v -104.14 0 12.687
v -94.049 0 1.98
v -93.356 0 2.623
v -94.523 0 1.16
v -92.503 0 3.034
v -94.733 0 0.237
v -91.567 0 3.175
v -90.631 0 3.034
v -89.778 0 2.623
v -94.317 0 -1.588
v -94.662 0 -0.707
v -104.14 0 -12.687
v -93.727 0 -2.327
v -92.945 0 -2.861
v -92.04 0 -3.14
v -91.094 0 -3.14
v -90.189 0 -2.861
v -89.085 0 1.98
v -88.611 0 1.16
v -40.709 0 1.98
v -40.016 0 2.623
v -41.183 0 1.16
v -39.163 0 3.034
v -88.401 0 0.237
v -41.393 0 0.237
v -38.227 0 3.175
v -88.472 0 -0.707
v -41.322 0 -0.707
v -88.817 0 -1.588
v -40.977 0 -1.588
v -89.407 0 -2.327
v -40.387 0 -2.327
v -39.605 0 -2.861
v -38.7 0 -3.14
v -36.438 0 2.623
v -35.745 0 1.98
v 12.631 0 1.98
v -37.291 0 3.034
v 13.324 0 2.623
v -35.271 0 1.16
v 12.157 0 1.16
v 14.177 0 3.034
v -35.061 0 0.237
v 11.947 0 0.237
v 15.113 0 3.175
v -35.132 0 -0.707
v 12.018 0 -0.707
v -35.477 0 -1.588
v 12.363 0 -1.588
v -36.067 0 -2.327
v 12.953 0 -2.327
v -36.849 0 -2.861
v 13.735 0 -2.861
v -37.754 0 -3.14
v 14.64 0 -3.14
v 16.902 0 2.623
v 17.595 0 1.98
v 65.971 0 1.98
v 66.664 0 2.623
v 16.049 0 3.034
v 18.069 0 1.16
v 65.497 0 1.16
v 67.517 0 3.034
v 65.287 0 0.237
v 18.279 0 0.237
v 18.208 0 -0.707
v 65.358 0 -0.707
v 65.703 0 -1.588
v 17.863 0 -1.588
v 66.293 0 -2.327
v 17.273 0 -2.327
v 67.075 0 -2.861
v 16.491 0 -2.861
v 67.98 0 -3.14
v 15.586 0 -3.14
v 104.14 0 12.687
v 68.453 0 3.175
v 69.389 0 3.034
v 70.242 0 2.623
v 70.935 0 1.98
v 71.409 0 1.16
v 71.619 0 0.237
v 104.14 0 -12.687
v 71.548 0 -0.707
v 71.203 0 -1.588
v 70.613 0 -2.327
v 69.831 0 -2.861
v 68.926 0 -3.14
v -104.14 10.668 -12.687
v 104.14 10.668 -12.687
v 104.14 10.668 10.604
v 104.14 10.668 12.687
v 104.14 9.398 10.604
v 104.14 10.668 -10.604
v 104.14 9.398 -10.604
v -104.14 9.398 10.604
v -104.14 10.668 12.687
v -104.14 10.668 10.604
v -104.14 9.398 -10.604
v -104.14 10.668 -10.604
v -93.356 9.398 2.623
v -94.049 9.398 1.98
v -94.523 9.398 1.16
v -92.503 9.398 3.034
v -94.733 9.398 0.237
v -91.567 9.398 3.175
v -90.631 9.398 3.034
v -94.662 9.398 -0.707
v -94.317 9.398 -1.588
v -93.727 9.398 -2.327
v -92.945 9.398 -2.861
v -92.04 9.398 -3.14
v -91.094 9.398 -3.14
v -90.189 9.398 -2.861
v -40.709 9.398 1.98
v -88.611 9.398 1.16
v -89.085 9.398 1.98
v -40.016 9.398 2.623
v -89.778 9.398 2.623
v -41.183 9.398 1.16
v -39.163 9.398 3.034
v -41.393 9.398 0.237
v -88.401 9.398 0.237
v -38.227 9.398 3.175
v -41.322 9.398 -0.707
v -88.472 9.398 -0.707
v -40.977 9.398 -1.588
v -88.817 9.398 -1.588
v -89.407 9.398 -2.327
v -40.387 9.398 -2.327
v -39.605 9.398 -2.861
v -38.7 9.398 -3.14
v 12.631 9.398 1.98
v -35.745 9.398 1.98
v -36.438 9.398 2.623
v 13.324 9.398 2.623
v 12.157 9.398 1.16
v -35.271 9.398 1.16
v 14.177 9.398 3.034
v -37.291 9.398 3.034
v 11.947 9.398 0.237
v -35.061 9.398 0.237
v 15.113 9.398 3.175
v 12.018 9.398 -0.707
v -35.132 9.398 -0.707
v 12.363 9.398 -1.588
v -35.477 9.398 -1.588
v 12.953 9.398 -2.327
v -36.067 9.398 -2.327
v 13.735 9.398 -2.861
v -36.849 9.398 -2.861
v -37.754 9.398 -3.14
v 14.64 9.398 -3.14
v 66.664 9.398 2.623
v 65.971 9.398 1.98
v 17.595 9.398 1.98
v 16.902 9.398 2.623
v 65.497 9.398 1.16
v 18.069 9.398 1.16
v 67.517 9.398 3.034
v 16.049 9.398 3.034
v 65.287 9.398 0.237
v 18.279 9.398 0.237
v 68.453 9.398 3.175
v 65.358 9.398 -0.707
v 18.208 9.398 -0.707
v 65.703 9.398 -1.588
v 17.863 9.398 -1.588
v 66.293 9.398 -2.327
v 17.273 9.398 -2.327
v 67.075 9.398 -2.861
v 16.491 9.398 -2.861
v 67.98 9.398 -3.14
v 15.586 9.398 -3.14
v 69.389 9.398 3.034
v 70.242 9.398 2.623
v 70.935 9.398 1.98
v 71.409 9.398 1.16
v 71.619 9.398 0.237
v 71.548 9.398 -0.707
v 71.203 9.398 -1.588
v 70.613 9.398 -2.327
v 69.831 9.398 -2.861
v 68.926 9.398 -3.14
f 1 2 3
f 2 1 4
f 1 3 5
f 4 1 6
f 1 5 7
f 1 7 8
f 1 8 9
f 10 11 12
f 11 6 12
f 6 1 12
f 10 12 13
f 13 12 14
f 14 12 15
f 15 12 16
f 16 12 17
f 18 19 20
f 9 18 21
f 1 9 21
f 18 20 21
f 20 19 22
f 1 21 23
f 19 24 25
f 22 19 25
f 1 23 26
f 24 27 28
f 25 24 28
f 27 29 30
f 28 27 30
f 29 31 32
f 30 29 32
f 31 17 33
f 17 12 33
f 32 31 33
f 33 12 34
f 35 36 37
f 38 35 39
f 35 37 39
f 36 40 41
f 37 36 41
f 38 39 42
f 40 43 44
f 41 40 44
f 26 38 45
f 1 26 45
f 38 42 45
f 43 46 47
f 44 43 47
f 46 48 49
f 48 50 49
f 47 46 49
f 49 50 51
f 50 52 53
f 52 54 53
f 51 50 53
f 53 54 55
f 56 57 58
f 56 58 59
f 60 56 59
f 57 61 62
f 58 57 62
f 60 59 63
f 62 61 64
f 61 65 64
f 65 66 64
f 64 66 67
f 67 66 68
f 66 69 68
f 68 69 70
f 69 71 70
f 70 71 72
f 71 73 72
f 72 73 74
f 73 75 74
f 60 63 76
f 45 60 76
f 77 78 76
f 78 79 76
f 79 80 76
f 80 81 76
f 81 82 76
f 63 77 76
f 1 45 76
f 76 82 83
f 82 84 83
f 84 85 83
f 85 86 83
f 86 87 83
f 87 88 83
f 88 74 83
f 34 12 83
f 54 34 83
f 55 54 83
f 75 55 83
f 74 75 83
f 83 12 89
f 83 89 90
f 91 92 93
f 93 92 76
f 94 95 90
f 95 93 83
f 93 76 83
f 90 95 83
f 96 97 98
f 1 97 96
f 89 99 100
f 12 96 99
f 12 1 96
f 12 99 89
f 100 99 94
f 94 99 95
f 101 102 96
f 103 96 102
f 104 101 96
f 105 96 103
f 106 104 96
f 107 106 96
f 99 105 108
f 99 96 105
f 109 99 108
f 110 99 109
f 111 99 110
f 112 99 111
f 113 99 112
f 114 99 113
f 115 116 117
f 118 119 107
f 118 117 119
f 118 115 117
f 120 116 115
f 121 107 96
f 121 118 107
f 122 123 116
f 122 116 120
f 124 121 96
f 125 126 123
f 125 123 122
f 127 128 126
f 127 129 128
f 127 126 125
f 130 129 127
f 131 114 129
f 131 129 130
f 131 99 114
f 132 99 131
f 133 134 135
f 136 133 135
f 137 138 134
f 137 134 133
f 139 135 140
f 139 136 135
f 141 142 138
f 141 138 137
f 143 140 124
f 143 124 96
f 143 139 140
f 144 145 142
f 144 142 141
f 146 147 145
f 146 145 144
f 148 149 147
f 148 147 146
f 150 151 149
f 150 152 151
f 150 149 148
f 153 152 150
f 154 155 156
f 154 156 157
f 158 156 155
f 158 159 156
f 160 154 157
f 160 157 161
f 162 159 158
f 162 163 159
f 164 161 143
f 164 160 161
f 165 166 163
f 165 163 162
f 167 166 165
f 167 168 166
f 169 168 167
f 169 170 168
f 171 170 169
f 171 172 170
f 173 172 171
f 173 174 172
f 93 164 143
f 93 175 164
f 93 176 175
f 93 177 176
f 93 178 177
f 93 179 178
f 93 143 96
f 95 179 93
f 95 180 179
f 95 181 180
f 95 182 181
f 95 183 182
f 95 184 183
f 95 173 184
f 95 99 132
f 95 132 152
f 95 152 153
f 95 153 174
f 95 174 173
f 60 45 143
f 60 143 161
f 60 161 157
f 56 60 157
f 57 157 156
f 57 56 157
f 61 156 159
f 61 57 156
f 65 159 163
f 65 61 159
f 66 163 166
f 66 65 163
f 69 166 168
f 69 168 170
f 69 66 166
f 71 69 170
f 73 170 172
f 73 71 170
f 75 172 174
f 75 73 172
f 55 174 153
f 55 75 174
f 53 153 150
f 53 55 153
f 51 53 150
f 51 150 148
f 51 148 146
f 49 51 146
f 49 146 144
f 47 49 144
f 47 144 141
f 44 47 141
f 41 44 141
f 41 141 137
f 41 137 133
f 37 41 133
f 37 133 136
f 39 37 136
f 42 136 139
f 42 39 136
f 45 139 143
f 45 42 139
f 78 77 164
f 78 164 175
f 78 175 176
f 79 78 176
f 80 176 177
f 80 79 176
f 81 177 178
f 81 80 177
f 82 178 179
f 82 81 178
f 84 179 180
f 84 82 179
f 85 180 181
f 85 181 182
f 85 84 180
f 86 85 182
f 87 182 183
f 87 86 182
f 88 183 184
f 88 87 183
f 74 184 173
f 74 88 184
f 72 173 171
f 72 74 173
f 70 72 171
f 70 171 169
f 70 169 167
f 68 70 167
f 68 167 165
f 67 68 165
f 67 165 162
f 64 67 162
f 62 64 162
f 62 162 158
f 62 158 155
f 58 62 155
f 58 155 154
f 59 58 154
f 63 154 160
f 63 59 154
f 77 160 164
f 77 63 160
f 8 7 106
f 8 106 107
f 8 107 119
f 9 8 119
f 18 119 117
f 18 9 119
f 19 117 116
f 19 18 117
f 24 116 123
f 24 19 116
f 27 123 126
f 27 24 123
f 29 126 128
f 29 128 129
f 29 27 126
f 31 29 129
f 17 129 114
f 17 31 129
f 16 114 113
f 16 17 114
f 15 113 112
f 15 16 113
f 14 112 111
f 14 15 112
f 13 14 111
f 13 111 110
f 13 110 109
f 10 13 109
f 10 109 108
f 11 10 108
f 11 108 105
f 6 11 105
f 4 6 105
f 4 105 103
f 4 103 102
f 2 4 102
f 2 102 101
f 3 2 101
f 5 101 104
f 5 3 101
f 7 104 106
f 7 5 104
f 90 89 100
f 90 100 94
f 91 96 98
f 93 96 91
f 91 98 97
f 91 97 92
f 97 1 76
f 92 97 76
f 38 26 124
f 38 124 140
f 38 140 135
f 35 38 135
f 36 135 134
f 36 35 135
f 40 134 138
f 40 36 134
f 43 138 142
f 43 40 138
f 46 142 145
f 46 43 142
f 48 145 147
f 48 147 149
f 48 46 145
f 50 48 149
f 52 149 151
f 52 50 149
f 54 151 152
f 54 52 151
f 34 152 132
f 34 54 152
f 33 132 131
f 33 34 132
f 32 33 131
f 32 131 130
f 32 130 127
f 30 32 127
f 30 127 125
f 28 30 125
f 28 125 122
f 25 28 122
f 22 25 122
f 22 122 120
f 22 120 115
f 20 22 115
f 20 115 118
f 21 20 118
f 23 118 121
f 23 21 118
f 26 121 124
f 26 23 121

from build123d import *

# Parameters (mm, degrees)
SKETCH1_W           = 208.28
SKETCH1_H           = 25.3746
SKETCH1_R           = 3.175
BOSS_EXTRUDE1_DEPTH = 9.398
SKETCH2_W           = 208.28
SKETCH2_H           = 2.0828
BOSS_EXTRUDE2_DEPTH = 1.27


with BuildPart() as part:
    # Sketch1 → Boss-Extrude1 (new body)
    with BuildSketch(Plane(origin=(0, 0, 0), x_dir=(1, 0, 0), z_dir=(0, 1, 0))):
        Rectangle(SKETCH1_W, SKETCH1_H)
        with Locations(Location((-91.567, 0, 0), (0, 0, 270))):
            Circle(SKETCH1_R, mode=Mode.SUBTRACT)
        with Locations(Location((-38.227, 0, 0), (0, 0, 270))):
            Circle(SKETCH1_R, mode=Mode.SUBTRACT)
        with Locations(Location((15.113, 0, 0), (0, 0, 270))):
            Circle(SKETCH1_R, mode=Mode.SUBTRACT)
        with Locations(Location((68.453, 0, 0), (0, 0, 270))):
            Circle(SKETCH1_R, mode=Mode.SUBTRACT)
    extrude(amount=BOSS_EXTRUDE1_DEPTH)

    # Sketch2 → Boss-Extrude2 (add)
    with BuildSketch(Plane(origin=(0, 9.398, 0), x_dir=(1, 0, 0), z_dir=(0, 1, 0))):
        with Locations((0, 11.6459)):
            Rectangle(SKETCH2_W, SKETCH2_H)
        with Locations((0, -11.6459)):
            Rectangle(SKETCH2_W, SKETCH2_H)
    extrude(amount=BOSS_EXTRUDE2_DEPTH)


solid = part.part
